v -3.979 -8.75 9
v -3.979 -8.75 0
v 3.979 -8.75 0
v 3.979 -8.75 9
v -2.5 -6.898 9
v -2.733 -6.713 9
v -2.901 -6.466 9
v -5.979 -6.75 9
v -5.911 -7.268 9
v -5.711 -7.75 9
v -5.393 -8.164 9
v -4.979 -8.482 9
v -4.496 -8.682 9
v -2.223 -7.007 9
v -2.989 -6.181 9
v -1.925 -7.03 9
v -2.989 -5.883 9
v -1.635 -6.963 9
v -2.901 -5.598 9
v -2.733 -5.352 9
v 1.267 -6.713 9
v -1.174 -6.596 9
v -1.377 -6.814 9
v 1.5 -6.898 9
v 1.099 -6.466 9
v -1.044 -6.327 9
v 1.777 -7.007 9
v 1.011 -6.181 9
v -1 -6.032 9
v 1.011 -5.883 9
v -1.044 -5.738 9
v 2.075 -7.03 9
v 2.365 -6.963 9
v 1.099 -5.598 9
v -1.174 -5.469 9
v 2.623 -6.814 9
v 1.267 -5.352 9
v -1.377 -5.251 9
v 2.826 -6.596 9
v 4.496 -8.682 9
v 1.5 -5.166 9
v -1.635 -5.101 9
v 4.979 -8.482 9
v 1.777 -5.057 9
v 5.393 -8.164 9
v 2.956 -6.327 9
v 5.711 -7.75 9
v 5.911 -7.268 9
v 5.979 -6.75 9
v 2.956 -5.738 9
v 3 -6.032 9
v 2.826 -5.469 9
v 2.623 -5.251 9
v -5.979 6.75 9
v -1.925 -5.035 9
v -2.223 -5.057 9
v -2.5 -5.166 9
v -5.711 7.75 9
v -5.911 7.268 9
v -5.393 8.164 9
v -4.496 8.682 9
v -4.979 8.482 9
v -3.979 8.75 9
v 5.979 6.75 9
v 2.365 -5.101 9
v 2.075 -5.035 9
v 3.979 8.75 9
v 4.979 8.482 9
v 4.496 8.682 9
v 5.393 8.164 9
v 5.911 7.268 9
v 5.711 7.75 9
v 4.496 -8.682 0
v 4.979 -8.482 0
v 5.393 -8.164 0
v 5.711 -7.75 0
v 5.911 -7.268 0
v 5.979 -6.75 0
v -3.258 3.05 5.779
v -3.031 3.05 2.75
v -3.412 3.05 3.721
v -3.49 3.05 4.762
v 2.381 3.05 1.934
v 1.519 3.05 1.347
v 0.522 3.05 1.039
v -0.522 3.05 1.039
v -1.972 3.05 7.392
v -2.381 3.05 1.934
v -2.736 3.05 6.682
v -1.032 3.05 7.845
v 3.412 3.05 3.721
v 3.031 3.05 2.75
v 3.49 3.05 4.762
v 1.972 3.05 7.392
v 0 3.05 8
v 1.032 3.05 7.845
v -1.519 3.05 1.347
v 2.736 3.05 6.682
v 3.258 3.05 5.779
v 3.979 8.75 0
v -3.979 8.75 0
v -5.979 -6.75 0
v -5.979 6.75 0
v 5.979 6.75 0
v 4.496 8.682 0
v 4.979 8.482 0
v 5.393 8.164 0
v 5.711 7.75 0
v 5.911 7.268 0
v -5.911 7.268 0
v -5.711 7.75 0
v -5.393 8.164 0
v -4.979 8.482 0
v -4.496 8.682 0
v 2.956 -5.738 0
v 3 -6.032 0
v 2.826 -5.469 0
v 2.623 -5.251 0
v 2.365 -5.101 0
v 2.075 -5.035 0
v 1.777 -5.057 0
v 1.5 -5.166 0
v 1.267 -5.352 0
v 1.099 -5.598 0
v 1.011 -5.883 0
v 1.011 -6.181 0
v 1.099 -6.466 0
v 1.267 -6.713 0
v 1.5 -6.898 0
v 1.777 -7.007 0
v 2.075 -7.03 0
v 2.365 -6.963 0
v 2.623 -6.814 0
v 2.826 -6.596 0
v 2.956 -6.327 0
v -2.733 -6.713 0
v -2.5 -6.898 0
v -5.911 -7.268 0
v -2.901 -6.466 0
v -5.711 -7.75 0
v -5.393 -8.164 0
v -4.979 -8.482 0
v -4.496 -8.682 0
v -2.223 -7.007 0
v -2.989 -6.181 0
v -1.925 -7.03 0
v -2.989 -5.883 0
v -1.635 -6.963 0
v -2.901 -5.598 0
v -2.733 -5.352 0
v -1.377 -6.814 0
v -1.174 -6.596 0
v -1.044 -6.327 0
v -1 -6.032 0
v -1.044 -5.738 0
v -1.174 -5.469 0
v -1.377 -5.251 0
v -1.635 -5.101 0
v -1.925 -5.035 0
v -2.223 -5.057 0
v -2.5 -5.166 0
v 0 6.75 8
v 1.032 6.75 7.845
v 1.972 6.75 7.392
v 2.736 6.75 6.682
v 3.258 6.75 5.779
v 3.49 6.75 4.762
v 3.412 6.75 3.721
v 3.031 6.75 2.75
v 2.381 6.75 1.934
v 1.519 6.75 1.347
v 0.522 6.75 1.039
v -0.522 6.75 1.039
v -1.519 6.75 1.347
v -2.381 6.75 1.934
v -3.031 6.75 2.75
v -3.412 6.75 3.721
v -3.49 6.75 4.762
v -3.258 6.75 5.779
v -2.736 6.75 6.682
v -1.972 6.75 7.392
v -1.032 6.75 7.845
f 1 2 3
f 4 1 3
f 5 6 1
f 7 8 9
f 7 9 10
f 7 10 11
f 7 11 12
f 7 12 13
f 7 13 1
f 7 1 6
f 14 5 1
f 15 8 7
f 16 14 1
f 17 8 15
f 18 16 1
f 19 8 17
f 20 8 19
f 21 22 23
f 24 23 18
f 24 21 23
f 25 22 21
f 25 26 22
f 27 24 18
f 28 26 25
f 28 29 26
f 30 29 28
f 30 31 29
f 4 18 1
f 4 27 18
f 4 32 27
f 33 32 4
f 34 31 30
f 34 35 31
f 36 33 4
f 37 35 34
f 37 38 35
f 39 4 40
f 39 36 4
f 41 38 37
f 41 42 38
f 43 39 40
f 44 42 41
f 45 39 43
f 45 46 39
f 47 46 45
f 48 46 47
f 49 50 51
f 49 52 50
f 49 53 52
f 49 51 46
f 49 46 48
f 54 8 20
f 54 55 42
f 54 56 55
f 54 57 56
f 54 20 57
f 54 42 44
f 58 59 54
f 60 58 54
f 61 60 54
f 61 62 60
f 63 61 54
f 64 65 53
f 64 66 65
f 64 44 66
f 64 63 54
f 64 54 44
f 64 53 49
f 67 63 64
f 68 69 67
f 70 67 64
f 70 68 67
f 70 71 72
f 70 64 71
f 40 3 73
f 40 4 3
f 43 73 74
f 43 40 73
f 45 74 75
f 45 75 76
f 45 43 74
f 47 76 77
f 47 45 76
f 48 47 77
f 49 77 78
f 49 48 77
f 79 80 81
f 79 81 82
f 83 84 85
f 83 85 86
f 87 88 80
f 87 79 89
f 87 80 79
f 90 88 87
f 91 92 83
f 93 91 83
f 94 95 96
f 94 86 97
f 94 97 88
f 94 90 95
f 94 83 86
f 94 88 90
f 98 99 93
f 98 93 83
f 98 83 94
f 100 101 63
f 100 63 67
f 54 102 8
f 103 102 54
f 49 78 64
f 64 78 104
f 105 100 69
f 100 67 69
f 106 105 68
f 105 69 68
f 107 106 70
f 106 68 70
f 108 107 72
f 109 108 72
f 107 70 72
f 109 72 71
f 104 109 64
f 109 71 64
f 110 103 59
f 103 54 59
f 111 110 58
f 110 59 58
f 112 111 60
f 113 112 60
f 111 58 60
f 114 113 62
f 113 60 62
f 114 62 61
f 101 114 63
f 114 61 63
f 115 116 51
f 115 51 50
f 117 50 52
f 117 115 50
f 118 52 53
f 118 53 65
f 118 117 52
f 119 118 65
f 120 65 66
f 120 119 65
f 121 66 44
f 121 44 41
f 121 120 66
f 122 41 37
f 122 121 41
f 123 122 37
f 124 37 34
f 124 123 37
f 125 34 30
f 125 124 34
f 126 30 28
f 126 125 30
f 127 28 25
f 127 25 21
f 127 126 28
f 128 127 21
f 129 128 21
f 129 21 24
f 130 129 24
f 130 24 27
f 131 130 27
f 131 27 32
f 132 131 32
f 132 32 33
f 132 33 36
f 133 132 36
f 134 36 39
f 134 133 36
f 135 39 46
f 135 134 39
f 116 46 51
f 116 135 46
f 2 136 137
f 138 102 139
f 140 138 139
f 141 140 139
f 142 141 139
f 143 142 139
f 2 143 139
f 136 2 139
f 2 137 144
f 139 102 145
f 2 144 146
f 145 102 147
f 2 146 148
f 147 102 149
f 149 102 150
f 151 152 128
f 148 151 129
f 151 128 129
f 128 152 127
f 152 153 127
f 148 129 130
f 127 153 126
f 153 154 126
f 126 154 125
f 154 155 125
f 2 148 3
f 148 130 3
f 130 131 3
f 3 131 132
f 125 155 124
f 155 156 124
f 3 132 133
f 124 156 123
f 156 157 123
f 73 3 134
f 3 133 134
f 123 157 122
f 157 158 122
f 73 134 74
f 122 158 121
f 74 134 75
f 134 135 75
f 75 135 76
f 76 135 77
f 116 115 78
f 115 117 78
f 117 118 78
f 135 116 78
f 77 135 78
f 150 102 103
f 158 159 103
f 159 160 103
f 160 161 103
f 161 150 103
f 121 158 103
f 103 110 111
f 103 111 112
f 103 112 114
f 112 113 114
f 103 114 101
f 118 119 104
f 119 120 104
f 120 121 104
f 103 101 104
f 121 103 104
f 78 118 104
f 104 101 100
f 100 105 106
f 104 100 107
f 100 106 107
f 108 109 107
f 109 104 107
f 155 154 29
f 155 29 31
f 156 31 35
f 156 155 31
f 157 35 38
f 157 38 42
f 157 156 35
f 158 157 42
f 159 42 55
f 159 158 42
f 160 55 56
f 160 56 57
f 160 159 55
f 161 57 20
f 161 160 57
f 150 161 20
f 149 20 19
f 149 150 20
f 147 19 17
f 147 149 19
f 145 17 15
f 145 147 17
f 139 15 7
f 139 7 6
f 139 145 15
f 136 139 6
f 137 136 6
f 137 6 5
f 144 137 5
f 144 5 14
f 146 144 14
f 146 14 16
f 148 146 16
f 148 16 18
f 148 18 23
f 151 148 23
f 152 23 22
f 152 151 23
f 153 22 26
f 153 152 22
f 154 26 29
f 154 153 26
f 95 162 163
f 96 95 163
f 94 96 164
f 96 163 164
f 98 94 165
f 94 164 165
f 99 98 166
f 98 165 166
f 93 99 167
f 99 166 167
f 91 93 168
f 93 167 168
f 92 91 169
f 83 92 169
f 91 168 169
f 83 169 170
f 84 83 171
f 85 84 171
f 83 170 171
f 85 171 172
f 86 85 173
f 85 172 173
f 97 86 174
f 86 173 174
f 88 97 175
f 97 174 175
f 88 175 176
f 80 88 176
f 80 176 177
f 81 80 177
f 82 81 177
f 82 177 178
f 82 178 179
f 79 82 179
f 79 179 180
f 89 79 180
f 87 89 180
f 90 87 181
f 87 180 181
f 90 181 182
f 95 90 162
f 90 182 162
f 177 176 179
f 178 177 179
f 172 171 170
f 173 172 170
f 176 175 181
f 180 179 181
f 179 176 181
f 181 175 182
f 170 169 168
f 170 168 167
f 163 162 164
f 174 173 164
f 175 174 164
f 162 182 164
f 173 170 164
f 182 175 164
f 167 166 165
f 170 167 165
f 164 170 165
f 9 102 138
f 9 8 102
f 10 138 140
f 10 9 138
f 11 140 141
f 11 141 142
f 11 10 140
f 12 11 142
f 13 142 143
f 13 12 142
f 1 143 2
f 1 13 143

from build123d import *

# Parameters (mm, degrees)
SKETCH1_W           = 11.957581354
SKETCH1_H           = 17.5
SKETCH1_R           = 1
BOSS_EXTRUDE1_DEPTH = 9
CUT_EXTRUDE1_START  = -2
SKETCH2_R           = 3.5
CUT_EXTRUDE1_DEPTH  = 3.7
FILLET1_R           = 2


with BuildPart() as part:
    # Sketch1 → Boss-Extrude1 (new body)
    with BuildSketch(Plane.XY):
        Rectangle(SKETCH1_W, SKETCH1_H)
        with Locations((-2, -6.032367874)):
            Circle(SKETCH1_R, mode=Mode.SUBTRACT)
        with Locations((2, -6.032367874)):
            Circle(SKETCH1_R, mode=Mode.SUBTRACT)
    extrude(amount=BOSS_EXTRUDE1_DEPTH)

    # Sketch2 → Cut-Extrude1 (cut)
    with BuildSketch(Plane(origin=(0, 8.75, 0), x_dir=(1, 0, 0), z_dir=(0, 1, 0)).offset(CUT_EXTRUDE1_START)):
        with Locations(Location((0, -4.5, 0), (0, 0, 270))):
            Circle(SKETCH2_R)
    extrude(amount=-CUT_EXTRUDE1_DEPTH, mode=Mode.SUBTRACT)

    # Fillet1
    fillet1_edges = [part.edges().sort_by_distance(p)[0] for p in [
        (5.978790677, -8.75, 4.5),
        (-5.978790677, -8.75, 4.5),
        (-5.978790677, 8.75, 4.5),
        (5.978790677, 8.75, 4.5),
    ]]
    fillet(fillet1_edges, radius=FILLET1_R)


solid = part.part
